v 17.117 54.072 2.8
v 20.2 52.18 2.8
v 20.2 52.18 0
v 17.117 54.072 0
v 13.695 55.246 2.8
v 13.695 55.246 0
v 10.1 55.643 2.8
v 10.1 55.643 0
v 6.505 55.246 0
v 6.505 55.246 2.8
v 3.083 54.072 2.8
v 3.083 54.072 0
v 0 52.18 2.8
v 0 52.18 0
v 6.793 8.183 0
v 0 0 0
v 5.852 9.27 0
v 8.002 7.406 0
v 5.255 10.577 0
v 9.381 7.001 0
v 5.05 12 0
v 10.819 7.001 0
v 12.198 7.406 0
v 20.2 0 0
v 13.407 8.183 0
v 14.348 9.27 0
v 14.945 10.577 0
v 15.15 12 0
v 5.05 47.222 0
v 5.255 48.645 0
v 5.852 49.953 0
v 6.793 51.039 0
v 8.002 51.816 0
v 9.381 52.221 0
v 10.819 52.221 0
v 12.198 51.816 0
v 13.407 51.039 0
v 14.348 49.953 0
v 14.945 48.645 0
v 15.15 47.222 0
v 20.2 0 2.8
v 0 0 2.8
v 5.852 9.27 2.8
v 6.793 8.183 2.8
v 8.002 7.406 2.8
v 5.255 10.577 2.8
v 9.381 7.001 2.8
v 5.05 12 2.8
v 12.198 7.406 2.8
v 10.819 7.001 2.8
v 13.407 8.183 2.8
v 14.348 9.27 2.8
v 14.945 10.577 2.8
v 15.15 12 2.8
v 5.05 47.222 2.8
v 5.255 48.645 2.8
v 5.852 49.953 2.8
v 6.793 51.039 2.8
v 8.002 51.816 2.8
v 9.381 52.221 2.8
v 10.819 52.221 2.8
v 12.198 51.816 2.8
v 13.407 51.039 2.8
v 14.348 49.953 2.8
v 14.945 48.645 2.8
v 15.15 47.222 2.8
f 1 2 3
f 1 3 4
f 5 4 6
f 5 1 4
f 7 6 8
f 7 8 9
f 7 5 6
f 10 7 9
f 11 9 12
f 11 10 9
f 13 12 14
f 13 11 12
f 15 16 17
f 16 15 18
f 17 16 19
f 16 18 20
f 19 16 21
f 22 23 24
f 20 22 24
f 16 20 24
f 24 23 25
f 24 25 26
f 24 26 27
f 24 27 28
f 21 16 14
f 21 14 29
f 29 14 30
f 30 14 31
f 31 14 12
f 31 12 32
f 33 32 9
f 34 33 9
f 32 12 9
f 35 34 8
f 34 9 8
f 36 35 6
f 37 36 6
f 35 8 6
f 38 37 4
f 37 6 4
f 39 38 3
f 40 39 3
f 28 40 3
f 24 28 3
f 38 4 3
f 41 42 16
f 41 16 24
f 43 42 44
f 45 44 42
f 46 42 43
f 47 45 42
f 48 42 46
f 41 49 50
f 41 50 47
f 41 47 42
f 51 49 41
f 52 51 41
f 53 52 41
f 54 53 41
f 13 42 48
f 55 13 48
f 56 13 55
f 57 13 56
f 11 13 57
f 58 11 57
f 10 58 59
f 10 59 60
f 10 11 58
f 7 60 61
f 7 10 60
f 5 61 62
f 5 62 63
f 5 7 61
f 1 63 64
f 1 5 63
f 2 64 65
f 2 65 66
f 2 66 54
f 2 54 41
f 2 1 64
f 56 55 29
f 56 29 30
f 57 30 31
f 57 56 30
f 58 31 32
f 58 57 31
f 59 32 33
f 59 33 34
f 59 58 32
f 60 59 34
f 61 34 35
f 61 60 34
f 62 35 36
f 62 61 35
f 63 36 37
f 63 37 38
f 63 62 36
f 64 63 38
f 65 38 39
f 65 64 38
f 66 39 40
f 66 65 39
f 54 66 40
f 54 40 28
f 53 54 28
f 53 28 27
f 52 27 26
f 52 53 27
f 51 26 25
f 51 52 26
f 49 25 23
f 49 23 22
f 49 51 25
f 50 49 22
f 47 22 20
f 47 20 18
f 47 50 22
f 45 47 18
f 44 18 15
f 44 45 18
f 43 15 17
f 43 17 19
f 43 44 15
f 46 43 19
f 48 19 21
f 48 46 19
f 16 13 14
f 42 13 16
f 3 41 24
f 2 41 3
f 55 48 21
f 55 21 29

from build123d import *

# Parameters (mm, degrees)
BOSS_EXTRUDE1_DEPTH = 2.8


with BuildPart() as part:
    # Sketch1 → Boss-Extrude1 (new body)
    with BuildSketch(Plane.XY.offset(2.8)):
        with BuildLine():
            Line((0, 52.179630025), (0, 0))
            Line((0, 0), (20.2, 0))
            Line((20.2, 0), (20.2, 52.179630025))
            ThreePointArc((20.2, 52.179630025), (10.1, 55.643160629), (0, 52.179630025))
        make_face()
        with BuildLine():
            Line((15.15, 47.222342094), (15.15, 12))
            ThreePointArc((15.15, 12), (10.1, 6.95), (5.05, 12))
            Line((5.05, 12), (5.05, 47.222342094))
            ThreePointArc((5.05, 47.222342094), (10.1, 52.272342094), (15.15, 47.222342094))
        make_face(mode=Mode.SUBTRACT)
    extrude(amount=-BOSS_EXTRUDE1_DEPTH)


solid = part.part
